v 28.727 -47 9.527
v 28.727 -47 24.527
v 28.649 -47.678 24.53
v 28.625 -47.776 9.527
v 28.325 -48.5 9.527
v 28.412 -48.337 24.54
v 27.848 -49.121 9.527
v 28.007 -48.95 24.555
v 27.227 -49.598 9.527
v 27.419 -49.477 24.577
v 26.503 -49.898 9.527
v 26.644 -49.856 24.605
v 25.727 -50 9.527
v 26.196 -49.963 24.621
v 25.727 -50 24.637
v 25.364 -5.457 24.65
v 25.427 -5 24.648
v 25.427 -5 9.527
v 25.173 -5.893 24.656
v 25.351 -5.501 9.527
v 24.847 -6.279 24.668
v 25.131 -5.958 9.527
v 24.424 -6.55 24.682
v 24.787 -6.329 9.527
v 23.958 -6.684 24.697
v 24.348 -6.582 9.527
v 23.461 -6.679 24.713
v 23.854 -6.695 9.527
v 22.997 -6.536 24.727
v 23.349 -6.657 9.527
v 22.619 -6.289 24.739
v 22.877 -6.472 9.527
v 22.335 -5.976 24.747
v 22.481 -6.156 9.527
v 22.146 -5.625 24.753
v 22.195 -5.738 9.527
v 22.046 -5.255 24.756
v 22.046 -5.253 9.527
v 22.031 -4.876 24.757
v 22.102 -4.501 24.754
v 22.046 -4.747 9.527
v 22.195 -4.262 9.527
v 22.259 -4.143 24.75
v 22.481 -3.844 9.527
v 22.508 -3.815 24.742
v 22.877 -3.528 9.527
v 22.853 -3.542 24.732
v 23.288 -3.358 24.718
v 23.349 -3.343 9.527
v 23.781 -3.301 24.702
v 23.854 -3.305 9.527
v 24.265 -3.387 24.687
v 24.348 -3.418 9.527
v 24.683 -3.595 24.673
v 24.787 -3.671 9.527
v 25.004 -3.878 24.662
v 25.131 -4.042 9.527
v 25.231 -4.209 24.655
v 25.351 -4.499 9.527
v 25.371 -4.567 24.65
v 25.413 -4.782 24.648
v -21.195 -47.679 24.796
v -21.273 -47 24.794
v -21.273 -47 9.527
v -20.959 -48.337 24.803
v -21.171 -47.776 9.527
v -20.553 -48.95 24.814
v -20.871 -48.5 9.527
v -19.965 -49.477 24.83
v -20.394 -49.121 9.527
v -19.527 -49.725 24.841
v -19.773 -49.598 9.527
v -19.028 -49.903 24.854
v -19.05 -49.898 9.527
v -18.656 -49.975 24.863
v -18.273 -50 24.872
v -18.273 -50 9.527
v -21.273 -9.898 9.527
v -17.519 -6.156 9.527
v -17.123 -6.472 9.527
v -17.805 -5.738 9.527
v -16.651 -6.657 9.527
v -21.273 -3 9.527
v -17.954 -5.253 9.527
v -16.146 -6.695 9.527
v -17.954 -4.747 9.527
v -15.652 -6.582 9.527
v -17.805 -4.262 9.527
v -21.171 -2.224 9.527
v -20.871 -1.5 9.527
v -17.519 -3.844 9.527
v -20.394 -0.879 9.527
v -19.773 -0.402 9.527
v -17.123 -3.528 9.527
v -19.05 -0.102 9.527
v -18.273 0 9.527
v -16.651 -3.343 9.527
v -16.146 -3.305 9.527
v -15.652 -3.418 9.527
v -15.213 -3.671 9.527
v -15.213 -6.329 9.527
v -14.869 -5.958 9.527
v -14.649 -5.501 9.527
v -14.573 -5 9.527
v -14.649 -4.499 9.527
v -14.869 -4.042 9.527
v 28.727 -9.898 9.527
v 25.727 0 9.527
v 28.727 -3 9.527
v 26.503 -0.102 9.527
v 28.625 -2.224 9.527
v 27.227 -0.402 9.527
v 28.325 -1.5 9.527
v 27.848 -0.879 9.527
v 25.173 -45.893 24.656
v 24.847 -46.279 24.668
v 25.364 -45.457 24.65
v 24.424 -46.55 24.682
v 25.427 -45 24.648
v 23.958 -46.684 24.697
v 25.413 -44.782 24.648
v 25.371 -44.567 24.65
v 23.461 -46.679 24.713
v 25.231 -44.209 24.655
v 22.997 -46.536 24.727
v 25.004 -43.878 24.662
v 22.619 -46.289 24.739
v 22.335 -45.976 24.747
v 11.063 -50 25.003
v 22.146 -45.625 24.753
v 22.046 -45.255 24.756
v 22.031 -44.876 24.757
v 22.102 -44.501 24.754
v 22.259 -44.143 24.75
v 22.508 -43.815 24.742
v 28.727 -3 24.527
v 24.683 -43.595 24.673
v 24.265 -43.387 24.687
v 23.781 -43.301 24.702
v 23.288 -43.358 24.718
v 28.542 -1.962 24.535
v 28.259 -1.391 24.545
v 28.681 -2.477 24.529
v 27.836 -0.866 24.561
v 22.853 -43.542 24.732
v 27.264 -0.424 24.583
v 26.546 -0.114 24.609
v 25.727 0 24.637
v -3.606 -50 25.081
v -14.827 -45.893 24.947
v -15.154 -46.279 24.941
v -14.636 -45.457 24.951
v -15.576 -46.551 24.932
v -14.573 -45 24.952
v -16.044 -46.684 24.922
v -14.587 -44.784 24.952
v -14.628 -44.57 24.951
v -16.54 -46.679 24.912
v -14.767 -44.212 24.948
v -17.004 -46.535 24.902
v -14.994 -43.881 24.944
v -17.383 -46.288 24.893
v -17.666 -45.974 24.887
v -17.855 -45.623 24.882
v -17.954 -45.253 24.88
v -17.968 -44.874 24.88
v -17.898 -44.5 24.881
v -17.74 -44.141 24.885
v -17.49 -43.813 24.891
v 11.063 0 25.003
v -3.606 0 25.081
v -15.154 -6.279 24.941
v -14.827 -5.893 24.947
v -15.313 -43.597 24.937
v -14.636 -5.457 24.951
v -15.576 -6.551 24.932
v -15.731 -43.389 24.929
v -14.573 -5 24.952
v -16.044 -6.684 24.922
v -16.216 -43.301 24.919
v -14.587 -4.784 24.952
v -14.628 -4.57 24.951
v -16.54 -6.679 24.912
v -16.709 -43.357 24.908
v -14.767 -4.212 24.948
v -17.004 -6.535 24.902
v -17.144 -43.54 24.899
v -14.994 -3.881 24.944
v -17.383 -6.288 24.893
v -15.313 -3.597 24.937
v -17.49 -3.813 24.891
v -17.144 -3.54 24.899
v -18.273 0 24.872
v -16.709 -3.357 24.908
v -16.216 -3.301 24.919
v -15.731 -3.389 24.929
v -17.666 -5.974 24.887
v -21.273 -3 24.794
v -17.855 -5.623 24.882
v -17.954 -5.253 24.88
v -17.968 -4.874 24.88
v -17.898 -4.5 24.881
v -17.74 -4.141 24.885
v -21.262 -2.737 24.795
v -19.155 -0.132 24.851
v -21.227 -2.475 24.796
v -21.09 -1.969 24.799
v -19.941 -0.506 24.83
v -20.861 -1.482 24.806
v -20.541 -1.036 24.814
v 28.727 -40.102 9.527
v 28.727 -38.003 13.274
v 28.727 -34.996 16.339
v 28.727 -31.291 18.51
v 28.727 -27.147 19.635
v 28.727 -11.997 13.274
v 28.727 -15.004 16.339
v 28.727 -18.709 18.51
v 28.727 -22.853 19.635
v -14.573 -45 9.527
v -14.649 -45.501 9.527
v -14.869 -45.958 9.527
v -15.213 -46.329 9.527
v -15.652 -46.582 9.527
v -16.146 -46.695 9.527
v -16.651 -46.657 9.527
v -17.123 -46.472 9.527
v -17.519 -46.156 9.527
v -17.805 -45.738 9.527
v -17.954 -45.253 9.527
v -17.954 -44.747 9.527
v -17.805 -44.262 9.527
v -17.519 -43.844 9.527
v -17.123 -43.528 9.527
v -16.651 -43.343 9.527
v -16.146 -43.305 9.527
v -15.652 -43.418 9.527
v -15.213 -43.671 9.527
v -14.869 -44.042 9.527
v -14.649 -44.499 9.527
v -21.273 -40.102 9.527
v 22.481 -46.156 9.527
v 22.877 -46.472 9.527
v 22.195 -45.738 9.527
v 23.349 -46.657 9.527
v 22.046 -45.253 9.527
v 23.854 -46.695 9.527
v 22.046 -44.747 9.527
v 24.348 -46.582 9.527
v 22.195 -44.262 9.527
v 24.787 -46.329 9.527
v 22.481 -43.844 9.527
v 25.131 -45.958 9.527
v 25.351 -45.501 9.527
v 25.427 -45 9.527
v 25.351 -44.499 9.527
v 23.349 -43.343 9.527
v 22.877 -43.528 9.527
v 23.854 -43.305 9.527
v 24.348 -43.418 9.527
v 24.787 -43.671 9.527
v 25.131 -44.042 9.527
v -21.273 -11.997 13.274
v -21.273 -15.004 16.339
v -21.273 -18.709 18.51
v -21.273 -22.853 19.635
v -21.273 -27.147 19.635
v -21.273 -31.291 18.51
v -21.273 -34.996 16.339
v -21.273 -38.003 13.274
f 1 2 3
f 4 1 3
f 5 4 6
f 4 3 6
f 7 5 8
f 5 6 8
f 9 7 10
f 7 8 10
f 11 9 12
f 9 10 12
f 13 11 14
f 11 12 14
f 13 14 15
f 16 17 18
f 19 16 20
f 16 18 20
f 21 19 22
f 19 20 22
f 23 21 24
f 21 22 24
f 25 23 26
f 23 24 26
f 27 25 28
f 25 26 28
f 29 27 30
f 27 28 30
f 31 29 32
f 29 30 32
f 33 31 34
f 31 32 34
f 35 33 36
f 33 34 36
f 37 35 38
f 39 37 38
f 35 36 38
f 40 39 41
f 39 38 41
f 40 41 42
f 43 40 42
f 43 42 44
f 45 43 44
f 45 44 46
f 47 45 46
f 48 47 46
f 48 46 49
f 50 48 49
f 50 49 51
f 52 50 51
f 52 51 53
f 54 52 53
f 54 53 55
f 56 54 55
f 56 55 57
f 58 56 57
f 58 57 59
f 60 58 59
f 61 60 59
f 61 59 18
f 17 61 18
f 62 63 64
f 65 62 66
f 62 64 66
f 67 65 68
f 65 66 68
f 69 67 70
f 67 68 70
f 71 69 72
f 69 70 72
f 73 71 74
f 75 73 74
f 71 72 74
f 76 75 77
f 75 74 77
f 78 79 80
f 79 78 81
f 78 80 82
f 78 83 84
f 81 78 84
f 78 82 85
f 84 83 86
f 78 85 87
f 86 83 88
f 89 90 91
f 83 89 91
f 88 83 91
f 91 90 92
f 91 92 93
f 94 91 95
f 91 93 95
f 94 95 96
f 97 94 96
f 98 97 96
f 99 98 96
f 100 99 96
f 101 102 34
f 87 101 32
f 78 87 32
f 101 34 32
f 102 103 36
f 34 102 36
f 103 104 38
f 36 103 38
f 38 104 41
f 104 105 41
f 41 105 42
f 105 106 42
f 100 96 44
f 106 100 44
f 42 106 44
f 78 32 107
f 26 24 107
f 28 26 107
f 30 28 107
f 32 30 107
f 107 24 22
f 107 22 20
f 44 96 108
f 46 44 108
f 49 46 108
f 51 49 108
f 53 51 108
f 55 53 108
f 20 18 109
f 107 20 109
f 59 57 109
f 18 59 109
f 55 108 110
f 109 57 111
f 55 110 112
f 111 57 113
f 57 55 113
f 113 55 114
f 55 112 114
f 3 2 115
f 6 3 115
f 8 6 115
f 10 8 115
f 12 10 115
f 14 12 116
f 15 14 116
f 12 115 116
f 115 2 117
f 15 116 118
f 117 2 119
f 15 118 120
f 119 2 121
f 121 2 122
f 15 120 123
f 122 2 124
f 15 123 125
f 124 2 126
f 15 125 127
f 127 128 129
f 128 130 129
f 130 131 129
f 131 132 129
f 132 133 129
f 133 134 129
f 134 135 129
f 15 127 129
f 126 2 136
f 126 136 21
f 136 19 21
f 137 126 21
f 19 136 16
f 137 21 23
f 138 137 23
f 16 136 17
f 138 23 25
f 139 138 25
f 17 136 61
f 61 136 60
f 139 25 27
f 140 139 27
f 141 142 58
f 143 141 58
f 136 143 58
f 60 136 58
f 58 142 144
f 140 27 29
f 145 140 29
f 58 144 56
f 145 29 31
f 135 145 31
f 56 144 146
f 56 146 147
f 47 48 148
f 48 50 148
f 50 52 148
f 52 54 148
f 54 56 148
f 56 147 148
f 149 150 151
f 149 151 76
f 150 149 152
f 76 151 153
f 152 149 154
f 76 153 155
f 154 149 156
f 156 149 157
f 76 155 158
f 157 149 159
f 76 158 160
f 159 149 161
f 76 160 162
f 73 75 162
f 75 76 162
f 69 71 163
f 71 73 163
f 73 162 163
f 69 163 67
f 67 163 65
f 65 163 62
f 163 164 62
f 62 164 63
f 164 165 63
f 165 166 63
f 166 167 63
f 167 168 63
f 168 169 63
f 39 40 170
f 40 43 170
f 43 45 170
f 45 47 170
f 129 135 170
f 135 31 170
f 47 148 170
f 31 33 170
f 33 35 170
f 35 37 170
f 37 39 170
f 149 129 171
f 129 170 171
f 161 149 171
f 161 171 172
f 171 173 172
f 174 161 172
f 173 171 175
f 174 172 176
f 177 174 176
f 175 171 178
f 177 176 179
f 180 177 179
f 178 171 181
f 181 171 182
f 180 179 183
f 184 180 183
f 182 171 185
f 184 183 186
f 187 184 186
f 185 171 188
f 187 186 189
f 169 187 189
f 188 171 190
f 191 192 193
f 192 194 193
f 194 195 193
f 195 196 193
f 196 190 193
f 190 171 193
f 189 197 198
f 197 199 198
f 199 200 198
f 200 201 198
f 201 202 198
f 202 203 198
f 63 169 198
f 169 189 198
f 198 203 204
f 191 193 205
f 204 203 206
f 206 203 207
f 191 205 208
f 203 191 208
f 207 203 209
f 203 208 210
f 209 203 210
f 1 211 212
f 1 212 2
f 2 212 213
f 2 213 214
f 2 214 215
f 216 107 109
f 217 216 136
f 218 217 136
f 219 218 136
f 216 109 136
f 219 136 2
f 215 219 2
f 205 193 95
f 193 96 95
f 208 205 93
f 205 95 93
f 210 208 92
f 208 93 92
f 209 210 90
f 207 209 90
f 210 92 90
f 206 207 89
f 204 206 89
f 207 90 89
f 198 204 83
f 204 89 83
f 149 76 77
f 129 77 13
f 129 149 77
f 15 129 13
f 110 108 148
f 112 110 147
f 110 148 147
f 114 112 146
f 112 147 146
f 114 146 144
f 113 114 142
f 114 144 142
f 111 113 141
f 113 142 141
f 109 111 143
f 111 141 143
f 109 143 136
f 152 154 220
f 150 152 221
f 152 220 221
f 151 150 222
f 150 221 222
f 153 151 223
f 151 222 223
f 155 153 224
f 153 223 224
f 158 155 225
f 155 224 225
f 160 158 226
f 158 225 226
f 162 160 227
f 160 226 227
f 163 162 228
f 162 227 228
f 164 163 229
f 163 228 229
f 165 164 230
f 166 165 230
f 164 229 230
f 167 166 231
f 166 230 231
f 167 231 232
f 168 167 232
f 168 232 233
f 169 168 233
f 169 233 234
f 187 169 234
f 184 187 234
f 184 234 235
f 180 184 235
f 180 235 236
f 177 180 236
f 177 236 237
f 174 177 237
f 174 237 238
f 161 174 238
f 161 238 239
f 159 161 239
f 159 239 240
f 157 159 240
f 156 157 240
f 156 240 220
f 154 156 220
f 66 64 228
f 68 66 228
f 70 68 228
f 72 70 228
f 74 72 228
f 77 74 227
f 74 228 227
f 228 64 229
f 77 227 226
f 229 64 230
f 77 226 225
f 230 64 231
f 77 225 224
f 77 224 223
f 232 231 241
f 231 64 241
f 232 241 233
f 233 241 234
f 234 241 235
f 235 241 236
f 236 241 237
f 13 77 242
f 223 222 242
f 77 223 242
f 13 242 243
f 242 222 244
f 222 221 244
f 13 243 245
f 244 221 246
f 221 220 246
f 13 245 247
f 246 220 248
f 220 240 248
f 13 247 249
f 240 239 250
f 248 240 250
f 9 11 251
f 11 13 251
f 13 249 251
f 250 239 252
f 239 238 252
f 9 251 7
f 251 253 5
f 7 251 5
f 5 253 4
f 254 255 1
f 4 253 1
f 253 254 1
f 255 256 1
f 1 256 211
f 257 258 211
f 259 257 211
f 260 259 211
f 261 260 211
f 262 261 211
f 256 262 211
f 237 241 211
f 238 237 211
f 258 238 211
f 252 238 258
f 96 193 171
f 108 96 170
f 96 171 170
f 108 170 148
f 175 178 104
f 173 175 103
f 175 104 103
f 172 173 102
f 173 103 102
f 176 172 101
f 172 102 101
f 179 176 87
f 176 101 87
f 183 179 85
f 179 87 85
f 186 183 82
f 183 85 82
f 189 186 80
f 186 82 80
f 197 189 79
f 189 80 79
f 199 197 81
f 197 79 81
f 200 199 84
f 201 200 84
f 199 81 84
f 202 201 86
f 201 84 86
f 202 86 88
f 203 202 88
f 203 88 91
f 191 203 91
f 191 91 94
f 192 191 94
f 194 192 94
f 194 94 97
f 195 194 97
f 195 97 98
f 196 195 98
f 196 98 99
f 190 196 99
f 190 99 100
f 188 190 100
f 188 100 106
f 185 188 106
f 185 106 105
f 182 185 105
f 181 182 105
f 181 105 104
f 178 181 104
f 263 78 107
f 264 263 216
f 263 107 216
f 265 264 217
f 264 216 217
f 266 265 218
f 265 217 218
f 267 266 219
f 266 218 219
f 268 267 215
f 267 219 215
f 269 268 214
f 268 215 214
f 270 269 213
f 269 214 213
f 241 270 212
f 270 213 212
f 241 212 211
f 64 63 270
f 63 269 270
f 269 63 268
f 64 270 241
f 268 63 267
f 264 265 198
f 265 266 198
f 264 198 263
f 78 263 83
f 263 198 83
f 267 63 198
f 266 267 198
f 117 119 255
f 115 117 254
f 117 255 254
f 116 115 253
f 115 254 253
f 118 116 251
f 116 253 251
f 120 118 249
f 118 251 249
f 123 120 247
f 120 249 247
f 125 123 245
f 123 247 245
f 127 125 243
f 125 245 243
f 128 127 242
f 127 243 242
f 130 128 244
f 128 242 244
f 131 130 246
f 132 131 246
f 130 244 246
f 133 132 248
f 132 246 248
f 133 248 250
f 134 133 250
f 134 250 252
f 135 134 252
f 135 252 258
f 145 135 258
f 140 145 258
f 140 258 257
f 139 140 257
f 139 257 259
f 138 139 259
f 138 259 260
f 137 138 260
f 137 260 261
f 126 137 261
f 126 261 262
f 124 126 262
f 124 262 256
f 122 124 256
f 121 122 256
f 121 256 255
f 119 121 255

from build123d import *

# Parameters (mm, degrees)
F1_DEPTH = 50
F2_R     = 16.25
F3_DEPTH = 50.001
F4_R     = 1.7
F5_DEPTH = 15.561876
F6_R     = 3


with BuildPart() as f1:
    # F0 (on Front) → F1 (new body)
    with BuildSketch(Plane.XZ):
        with BuildLine():
            Line((-21.273122, 9.52742), (28.726878, 9.52742))
            Line((28.726878, 9.52742), (28.726878, 24.52742))
            ThreePointArc((28.726878, 24.52742), (3.729103, 25.077618), (-21.273122, 24.794238))
            Line((-21.273122, 24.794238), (-21.273122, 9.52742))
        make_face()
    extrude(amount=F1_DEPTH)

    # F2 (on face) → F3 (cut, through all)
    with BuildSketch(Plane.YZ.offset(28.726878)):
        with Locations((-25, 3.52742)):
            Circle(F2_R)
    extrude(amount=-F3_DEPTH, mode=Mode.SUBTRACT)

    # F4 (on face) → F5 (cut, through all)
    with BuildSketch(Plane(origin=(0, 0, 9.52742), x_dir=(1, 0, 0), z_dir=(0, 0, -1))):
        with Locations((-16.273122, 45)):
            Circle(F4_R)
        with Locations((23.726878, 45)):
            Circle(F4_R)
        with Locations((-16.273122, 5)):
            Circle(F4_R)
        with Locations((23.726878, 5)):
            Circle(F4_R)
    extrude(amount=-F5_DEPTH, mode=Mode.SUBTRACT)

    # F6
    f6_edges = [f1.edges().sort_by_distance(p)[0] for p in [
        (28.726878, -50, 17.02742),
        (-21.273122, -50, 17.160829),
        (-21.273122, 0, 17.160829),
        (28.726878, 0, 17.02742),
    ]]
    fillet(f6_edges, radius=F6_R)


solid = f1.part
